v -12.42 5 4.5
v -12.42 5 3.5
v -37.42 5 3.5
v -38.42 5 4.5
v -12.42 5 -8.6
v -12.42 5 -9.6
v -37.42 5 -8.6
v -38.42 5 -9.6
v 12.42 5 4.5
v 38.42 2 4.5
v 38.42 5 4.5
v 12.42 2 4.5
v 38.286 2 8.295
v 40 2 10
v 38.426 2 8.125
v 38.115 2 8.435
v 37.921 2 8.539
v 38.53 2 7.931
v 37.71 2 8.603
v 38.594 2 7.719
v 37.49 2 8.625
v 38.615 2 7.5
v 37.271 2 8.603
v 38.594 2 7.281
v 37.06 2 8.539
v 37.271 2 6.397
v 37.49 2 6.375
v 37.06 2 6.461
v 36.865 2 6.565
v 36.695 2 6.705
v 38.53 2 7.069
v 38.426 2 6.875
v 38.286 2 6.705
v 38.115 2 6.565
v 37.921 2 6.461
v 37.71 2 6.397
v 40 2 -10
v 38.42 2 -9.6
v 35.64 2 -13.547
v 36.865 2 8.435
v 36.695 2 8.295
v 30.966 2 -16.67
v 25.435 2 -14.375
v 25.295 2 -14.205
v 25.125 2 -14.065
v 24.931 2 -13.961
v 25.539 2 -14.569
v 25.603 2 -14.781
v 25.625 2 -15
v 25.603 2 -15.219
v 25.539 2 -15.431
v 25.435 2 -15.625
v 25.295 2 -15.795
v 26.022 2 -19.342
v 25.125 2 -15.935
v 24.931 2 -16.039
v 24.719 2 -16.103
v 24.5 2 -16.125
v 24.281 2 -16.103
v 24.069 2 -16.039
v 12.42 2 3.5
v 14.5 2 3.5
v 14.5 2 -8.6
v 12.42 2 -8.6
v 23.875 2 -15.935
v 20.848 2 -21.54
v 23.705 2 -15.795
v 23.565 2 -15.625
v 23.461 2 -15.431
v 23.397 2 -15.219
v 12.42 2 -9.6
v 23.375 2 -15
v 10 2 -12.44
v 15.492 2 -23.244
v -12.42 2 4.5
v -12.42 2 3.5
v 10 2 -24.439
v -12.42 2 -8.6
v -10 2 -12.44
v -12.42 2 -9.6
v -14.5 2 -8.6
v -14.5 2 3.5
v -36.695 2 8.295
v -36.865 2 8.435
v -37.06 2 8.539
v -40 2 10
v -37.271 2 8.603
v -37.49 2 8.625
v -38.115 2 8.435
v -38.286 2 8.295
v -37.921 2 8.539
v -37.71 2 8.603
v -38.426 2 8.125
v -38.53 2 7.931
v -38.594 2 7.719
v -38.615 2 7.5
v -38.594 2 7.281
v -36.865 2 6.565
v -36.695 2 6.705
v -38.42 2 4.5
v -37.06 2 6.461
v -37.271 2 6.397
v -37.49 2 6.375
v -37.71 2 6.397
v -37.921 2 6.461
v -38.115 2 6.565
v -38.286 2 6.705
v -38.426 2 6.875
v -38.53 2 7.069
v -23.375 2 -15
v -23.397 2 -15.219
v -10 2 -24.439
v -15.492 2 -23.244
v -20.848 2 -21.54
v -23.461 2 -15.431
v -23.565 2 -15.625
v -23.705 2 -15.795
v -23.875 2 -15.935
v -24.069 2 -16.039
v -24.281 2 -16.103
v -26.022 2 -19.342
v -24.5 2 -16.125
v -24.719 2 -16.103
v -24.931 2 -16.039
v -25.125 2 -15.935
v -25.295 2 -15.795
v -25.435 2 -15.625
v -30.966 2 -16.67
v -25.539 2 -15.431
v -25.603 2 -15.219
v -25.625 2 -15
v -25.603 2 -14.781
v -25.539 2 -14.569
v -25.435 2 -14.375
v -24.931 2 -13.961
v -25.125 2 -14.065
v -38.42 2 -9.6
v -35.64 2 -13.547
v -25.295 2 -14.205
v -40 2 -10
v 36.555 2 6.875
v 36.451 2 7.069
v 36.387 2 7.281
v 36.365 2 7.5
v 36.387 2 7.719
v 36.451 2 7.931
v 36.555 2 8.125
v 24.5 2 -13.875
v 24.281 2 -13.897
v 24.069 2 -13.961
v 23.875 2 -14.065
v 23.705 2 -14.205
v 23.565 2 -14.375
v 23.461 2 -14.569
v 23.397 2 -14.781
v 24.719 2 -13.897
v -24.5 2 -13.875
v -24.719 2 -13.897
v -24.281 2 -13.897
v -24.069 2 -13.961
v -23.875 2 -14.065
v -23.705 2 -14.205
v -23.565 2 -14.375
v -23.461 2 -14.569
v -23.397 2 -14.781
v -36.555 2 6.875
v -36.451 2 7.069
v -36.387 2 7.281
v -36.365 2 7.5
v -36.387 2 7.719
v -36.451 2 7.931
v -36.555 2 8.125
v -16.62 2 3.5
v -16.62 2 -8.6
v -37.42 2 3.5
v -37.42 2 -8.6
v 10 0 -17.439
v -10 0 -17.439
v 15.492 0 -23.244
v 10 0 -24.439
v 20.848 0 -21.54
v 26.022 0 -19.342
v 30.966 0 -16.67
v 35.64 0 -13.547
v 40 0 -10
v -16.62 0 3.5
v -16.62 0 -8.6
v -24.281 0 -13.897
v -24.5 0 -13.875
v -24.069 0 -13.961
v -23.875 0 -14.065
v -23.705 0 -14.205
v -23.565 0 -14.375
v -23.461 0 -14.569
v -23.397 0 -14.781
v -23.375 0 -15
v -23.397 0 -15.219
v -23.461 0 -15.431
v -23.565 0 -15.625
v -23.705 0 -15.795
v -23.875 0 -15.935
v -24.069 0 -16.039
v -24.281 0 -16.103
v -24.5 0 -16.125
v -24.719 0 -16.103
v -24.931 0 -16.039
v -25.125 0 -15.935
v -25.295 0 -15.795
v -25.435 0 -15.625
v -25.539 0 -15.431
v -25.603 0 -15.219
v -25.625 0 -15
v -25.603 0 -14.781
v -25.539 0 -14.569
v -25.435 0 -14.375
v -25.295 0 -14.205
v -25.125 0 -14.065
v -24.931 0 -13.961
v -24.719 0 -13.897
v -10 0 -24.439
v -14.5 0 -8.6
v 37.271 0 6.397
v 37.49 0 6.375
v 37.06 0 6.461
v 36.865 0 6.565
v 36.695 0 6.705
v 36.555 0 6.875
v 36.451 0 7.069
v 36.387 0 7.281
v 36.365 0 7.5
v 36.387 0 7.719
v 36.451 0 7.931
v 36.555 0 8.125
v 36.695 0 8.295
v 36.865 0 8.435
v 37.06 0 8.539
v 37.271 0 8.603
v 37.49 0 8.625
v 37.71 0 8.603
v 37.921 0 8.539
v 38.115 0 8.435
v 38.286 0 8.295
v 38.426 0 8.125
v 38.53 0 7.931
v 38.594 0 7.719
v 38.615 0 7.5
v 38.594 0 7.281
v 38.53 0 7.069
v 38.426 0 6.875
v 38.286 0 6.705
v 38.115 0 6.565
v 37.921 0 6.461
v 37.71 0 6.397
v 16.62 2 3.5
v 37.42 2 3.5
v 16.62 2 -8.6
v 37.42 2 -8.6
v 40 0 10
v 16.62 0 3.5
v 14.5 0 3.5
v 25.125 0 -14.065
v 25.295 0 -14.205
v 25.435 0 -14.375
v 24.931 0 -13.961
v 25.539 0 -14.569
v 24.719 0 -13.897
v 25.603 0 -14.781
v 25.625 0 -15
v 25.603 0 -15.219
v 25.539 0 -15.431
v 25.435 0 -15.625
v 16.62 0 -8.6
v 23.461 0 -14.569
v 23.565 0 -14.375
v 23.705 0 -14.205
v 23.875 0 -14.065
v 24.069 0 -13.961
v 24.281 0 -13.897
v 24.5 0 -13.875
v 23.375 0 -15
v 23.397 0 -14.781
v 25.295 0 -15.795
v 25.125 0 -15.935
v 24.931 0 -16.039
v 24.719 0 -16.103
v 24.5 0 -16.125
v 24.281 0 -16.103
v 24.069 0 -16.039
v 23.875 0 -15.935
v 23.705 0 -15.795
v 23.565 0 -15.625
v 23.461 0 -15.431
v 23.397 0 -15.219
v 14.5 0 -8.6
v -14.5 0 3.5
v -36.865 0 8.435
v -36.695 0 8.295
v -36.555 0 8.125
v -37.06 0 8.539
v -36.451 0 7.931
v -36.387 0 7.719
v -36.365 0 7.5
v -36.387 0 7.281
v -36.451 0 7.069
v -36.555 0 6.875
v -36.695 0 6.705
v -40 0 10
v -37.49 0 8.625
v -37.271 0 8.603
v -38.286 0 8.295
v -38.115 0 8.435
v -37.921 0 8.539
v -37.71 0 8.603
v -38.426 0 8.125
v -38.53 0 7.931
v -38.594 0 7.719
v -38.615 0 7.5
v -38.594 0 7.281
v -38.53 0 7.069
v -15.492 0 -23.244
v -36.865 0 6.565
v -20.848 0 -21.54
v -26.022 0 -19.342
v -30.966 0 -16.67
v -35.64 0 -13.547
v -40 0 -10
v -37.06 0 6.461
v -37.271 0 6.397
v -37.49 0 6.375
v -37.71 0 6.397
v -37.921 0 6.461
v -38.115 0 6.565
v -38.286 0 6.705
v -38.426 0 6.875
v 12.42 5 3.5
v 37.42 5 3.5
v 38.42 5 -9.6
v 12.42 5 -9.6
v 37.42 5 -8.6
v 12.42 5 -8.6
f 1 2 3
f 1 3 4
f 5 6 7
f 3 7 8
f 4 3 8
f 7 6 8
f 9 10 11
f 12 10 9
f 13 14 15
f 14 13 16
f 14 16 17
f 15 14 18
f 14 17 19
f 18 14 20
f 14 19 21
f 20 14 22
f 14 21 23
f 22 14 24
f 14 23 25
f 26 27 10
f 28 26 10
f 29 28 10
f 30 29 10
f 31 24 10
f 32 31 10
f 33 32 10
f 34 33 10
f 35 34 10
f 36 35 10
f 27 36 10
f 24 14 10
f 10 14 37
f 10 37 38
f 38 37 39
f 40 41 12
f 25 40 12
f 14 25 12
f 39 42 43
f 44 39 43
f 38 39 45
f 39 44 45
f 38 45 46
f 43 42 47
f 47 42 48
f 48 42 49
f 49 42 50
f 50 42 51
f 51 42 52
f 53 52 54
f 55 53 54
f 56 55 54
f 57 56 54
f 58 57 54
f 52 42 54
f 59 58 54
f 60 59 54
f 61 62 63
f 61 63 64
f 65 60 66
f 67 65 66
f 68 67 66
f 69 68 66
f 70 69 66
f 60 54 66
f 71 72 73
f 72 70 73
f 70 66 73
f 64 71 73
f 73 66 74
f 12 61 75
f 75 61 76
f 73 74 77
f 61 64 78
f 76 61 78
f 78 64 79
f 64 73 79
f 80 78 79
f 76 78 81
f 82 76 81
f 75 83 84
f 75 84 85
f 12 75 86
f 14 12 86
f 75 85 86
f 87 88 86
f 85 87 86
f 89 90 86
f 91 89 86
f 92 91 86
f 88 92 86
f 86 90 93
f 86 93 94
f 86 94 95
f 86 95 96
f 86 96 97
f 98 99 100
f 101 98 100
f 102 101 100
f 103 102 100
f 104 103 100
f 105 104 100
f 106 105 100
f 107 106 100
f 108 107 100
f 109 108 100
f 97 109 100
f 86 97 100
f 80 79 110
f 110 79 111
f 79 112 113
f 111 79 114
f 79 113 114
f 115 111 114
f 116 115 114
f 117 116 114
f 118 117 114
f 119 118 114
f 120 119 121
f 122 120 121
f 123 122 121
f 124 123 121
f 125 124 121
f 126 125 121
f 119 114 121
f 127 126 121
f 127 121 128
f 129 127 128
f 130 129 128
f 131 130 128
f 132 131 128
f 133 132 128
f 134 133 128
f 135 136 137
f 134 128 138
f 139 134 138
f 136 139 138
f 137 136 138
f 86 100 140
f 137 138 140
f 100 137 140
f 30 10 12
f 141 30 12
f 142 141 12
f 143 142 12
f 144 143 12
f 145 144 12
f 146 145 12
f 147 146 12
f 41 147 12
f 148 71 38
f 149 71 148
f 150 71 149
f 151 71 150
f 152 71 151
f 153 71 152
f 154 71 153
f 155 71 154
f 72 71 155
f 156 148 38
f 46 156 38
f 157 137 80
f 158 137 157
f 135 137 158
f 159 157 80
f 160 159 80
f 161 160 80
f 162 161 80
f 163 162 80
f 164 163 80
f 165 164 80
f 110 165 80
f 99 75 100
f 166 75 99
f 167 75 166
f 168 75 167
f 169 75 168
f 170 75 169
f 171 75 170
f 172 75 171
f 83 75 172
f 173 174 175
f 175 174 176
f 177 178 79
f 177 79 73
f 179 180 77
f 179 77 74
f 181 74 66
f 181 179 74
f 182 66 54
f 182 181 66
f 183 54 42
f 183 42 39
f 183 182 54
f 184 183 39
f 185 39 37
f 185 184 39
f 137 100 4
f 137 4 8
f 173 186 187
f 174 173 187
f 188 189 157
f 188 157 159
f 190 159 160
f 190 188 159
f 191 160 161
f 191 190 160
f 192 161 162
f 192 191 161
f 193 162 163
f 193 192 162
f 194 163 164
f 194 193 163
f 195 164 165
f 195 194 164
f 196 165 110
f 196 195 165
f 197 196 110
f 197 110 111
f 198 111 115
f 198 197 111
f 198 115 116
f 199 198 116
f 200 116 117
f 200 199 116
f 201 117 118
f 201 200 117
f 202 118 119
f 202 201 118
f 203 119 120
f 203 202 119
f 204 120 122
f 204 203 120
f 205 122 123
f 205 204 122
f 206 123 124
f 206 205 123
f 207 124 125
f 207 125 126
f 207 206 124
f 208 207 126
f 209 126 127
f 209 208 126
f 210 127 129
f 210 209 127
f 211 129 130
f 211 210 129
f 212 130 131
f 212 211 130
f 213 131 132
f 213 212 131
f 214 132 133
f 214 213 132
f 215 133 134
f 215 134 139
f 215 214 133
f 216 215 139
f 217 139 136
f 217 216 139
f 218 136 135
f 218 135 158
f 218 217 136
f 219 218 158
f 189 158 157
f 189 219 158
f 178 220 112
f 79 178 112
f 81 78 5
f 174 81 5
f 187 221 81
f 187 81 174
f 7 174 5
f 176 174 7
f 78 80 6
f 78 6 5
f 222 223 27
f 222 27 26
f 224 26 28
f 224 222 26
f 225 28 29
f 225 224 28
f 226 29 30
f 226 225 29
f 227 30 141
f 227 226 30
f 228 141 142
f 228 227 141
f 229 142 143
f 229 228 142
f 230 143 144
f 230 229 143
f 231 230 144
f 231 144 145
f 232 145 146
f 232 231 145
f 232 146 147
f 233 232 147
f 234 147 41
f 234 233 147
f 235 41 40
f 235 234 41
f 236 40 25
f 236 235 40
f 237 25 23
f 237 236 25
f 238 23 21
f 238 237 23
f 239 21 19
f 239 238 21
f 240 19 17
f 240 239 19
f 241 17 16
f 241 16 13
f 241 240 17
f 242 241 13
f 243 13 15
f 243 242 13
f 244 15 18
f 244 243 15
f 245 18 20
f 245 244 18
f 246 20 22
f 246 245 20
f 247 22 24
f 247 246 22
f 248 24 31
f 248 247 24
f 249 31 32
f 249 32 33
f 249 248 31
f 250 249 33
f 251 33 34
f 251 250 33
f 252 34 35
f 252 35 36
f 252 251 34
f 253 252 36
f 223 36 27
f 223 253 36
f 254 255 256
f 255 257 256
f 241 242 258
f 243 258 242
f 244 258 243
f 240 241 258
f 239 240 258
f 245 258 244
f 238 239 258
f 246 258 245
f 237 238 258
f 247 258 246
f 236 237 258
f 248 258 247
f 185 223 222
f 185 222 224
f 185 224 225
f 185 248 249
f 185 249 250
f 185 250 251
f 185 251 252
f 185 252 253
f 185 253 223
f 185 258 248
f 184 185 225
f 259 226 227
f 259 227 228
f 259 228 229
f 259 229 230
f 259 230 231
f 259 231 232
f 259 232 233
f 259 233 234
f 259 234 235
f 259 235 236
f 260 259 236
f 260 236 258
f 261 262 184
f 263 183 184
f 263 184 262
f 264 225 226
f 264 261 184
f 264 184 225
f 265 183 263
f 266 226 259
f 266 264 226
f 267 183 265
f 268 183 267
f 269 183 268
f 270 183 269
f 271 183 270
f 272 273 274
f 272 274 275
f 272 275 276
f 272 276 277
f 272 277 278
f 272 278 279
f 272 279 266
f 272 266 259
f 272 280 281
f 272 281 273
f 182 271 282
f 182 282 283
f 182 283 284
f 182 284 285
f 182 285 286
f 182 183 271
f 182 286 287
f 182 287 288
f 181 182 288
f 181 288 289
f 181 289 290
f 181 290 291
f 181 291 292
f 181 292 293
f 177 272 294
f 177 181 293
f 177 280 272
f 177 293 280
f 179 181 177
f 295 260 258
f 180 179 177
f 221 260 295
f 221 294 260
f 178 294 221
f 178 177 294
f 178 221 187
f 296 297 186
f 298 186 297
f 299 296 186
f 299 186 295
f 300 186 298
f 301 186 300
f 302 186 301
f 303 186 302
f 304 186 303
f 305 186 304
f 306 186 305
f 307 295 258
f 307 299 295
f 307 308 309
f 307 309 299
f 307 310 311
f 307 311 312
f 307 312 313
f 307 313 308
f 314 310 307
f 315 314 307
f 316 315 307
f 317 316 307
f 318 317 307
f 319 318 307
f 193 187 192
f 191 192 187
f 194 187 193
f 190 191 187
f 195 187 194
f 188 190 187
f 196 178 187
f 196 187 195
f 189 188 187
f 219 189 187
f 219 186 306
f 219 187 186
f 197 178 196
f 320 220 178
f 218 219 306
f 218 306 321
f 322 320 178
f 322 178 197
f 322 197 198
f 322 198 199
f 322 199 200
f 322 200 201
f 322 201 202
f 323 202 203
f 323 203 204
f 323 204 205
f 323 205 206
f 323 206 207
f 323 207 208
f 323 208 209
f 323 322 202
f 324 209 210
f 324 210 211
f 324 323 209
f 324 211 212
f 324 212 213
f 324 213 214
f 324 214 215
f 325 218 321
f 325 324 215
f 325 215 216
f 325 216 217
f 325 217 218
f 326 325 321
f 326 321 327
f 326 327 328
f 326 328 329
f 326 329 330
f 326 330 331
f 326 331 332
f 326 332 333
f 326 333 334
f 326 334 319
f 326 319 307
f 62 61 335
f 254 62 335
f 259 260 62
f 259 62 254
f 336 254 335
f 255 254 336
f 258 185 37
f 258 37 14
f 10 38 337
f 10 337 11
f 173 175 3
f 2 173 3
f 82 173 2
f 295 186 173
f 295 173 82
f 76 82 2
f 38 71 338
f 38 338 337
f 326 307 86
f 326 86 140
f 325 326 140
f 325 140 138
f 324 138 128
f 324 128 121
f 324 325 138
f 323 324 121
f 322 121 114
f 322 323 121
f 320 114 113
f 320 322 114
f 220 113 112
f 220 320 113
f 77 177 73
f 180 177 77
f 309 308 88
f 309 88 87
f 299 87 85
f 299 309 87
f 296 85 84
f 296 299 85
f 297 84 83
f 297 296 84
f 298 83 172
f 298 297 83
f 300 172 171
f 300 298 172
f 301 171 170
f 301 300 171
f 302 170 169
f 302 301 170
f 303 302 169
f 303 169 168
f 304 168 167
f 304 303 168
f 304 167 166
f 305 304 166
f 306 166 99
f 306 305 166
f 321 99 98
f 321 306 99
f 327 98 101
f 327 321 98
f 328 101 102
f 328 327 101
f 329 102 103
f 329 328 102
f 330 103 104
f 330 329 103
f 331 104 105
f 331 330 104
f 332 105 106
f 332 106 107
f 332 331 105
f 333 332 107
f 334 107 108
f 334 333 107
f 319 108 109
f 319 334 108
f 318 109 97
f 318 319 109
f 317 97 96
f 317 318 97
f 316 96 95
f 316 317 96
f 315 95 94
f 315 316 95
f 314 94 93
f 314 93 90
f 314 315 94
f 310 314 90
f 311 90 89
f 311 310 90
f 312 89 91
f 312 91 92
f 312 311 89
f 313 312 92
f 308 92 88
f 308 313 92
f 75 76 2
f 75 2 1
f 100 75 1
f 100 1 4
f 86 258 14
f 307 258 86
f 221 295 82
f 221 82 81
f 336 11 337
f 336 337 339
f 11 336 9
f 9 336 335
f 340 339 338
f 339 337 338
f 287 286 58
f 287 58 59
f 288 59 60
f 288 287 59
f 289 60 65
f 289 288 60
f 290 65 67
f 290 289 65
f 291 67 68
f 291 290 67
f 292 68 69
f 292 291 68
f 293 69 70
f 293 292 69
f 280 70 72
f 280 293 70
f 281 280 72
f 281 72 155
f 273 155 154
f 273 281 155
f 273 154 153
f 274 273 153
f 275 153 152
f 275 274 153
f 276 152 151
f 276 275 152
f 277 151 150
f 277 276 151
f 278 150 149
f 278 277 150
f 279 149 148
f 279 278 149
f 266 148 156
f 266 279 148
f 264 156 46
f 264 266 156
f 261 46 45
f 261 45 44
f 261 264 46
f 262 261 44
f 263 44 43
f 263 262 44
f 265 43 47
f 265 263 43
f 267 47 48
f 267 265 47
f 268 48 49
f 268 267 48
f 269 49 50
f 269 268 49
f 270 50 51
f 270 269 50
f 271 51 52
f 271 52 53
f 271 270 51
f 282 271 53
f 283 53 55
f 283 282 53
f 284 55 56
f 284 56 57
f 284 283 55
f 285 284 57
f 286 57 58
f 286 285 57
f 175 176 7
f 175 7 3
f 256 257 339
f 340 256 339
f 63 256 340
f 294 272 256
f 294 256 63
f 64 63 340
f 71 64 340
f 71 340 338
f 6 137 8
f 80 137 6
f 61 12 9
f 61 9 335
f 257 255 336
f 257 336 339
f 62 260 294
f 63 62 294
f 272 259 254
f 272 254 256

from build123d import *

# Parameters (mm, degrees)
SKETCH2_R           = 1.125
SKETCH2_W           = 2.12
SKETCH2_H           = 12.1
BOSS_EXTRUDE2_DEPTH = 2
BOSS_EXTRUDE3_DEPTH = 3
CHAMFER1_SIZE2      = 2
CHAMFER1_SIZE       = 5


with BuildPart() as part:
    # Sketch2 → Boss-Extrude2 (new body)
    with BuildSketch(Plane(origin=(0, 0, 0), x_dir=(1, 0, 0), z_dir=(0, 1, 0))):
        with BuildLine():
            Line((-10, 24.439438281), (-10, 17.439438281))
            Line((-10, 17.439438281), (10, 17.439438281))
            Line((10, 17.439438281), (10, 24.439438281))
            ThreePointArc((10, 24.439438281), (26.021613026, 19.342266443), (40, 10))
            Line((40, 10), (40, -10))
            Line((40, -10), (-40, -10))
            Line((-40, -10), (-40, 10))
            ThreePointArc((-40, 10), (-26.021613026, 19.342266443), (-10, 24.439438281))
        make_face()
        with Locations(Location((-37.490381057, -7.5, 0), (0, 0, 270))):
            Circle(SKETCH2_R, mode=Mode.SUBTRACT)
        with Locations(Location((37.490381057, -7.5, 0), (0, 0, 90))):
            Circle(SKETCH2_R, mode=Mode.SUBTRACT)
        with Locations(Location((-24.5, 15, 0), (0, 0, 270))):
            Circle(SKETCH2_R, mode=Mode.SUBTRACT)
        with Locations(Location((24.5, 15, 0), (0, 0, 90))):
            Circle(SKETCH2_R, mode=Mode.SUBTRACT)
        with Locations((15.56, 2.55)):
            Rectangle(SKETCH2_W, SKETCH2_H, mode=Mode.SUBTRACT)
        with Locations((-15.56, 2.55)):
            Rectangle(SKETCH2_W, SKETCH2_H, mode=Mode.SUBTRACT)
    extrude(amount=BOSS_EXTRUDE2_DEPTH)

    # Sketch3 → Boss-Extrude3 (add)
    with BuildSketch(Plane(origin=(0, 2, 0), x_dir=(1, 0, 0), z_dir=(0, 1, 0))):
        Polygon((12.419999998, -3.5), (37.42, -3.5), (37.42, 8.6), (12.419999998, 8.6), (12.419999998, 9.599999996), (38.419999998, 9.599999996), (38.419999998, -4.499999996), (12.419999998, -4.499999996), align=None)
        Polygon((-12.419999998, -3.5), (-12.419999998, -4.499999996), (-38.419999998, -4.499999996), (-38.419999998, 9.599999996), (-12.419999998, 9.599999996), (-12.419999998, 8.6), (-37.42, 8.6), (-37.42, -3.5), align=None)
    extrude(amount=BOSS_EXTRUDE3_DEPTH)

    # Chamfer1
    chamfer1_edges = [part.edges().sort_by_distance(p)[0] for p in [
        (0, 2, -17.439438281),
    ]]
    chamfer1_side = [part.faces().sort_by_distance(p)[0] for p in [
        (0, 2, -17.399438281),
    ]]
    chamfer(chamfer1_edges, length=CHAMFER1_SIZE - 0.0001, length2=CHAMFER1_SIZE2 - 0.0001, reference=chamfer1_side[0])  # a hair under: the kernel refuses the full size


solid = part.part
